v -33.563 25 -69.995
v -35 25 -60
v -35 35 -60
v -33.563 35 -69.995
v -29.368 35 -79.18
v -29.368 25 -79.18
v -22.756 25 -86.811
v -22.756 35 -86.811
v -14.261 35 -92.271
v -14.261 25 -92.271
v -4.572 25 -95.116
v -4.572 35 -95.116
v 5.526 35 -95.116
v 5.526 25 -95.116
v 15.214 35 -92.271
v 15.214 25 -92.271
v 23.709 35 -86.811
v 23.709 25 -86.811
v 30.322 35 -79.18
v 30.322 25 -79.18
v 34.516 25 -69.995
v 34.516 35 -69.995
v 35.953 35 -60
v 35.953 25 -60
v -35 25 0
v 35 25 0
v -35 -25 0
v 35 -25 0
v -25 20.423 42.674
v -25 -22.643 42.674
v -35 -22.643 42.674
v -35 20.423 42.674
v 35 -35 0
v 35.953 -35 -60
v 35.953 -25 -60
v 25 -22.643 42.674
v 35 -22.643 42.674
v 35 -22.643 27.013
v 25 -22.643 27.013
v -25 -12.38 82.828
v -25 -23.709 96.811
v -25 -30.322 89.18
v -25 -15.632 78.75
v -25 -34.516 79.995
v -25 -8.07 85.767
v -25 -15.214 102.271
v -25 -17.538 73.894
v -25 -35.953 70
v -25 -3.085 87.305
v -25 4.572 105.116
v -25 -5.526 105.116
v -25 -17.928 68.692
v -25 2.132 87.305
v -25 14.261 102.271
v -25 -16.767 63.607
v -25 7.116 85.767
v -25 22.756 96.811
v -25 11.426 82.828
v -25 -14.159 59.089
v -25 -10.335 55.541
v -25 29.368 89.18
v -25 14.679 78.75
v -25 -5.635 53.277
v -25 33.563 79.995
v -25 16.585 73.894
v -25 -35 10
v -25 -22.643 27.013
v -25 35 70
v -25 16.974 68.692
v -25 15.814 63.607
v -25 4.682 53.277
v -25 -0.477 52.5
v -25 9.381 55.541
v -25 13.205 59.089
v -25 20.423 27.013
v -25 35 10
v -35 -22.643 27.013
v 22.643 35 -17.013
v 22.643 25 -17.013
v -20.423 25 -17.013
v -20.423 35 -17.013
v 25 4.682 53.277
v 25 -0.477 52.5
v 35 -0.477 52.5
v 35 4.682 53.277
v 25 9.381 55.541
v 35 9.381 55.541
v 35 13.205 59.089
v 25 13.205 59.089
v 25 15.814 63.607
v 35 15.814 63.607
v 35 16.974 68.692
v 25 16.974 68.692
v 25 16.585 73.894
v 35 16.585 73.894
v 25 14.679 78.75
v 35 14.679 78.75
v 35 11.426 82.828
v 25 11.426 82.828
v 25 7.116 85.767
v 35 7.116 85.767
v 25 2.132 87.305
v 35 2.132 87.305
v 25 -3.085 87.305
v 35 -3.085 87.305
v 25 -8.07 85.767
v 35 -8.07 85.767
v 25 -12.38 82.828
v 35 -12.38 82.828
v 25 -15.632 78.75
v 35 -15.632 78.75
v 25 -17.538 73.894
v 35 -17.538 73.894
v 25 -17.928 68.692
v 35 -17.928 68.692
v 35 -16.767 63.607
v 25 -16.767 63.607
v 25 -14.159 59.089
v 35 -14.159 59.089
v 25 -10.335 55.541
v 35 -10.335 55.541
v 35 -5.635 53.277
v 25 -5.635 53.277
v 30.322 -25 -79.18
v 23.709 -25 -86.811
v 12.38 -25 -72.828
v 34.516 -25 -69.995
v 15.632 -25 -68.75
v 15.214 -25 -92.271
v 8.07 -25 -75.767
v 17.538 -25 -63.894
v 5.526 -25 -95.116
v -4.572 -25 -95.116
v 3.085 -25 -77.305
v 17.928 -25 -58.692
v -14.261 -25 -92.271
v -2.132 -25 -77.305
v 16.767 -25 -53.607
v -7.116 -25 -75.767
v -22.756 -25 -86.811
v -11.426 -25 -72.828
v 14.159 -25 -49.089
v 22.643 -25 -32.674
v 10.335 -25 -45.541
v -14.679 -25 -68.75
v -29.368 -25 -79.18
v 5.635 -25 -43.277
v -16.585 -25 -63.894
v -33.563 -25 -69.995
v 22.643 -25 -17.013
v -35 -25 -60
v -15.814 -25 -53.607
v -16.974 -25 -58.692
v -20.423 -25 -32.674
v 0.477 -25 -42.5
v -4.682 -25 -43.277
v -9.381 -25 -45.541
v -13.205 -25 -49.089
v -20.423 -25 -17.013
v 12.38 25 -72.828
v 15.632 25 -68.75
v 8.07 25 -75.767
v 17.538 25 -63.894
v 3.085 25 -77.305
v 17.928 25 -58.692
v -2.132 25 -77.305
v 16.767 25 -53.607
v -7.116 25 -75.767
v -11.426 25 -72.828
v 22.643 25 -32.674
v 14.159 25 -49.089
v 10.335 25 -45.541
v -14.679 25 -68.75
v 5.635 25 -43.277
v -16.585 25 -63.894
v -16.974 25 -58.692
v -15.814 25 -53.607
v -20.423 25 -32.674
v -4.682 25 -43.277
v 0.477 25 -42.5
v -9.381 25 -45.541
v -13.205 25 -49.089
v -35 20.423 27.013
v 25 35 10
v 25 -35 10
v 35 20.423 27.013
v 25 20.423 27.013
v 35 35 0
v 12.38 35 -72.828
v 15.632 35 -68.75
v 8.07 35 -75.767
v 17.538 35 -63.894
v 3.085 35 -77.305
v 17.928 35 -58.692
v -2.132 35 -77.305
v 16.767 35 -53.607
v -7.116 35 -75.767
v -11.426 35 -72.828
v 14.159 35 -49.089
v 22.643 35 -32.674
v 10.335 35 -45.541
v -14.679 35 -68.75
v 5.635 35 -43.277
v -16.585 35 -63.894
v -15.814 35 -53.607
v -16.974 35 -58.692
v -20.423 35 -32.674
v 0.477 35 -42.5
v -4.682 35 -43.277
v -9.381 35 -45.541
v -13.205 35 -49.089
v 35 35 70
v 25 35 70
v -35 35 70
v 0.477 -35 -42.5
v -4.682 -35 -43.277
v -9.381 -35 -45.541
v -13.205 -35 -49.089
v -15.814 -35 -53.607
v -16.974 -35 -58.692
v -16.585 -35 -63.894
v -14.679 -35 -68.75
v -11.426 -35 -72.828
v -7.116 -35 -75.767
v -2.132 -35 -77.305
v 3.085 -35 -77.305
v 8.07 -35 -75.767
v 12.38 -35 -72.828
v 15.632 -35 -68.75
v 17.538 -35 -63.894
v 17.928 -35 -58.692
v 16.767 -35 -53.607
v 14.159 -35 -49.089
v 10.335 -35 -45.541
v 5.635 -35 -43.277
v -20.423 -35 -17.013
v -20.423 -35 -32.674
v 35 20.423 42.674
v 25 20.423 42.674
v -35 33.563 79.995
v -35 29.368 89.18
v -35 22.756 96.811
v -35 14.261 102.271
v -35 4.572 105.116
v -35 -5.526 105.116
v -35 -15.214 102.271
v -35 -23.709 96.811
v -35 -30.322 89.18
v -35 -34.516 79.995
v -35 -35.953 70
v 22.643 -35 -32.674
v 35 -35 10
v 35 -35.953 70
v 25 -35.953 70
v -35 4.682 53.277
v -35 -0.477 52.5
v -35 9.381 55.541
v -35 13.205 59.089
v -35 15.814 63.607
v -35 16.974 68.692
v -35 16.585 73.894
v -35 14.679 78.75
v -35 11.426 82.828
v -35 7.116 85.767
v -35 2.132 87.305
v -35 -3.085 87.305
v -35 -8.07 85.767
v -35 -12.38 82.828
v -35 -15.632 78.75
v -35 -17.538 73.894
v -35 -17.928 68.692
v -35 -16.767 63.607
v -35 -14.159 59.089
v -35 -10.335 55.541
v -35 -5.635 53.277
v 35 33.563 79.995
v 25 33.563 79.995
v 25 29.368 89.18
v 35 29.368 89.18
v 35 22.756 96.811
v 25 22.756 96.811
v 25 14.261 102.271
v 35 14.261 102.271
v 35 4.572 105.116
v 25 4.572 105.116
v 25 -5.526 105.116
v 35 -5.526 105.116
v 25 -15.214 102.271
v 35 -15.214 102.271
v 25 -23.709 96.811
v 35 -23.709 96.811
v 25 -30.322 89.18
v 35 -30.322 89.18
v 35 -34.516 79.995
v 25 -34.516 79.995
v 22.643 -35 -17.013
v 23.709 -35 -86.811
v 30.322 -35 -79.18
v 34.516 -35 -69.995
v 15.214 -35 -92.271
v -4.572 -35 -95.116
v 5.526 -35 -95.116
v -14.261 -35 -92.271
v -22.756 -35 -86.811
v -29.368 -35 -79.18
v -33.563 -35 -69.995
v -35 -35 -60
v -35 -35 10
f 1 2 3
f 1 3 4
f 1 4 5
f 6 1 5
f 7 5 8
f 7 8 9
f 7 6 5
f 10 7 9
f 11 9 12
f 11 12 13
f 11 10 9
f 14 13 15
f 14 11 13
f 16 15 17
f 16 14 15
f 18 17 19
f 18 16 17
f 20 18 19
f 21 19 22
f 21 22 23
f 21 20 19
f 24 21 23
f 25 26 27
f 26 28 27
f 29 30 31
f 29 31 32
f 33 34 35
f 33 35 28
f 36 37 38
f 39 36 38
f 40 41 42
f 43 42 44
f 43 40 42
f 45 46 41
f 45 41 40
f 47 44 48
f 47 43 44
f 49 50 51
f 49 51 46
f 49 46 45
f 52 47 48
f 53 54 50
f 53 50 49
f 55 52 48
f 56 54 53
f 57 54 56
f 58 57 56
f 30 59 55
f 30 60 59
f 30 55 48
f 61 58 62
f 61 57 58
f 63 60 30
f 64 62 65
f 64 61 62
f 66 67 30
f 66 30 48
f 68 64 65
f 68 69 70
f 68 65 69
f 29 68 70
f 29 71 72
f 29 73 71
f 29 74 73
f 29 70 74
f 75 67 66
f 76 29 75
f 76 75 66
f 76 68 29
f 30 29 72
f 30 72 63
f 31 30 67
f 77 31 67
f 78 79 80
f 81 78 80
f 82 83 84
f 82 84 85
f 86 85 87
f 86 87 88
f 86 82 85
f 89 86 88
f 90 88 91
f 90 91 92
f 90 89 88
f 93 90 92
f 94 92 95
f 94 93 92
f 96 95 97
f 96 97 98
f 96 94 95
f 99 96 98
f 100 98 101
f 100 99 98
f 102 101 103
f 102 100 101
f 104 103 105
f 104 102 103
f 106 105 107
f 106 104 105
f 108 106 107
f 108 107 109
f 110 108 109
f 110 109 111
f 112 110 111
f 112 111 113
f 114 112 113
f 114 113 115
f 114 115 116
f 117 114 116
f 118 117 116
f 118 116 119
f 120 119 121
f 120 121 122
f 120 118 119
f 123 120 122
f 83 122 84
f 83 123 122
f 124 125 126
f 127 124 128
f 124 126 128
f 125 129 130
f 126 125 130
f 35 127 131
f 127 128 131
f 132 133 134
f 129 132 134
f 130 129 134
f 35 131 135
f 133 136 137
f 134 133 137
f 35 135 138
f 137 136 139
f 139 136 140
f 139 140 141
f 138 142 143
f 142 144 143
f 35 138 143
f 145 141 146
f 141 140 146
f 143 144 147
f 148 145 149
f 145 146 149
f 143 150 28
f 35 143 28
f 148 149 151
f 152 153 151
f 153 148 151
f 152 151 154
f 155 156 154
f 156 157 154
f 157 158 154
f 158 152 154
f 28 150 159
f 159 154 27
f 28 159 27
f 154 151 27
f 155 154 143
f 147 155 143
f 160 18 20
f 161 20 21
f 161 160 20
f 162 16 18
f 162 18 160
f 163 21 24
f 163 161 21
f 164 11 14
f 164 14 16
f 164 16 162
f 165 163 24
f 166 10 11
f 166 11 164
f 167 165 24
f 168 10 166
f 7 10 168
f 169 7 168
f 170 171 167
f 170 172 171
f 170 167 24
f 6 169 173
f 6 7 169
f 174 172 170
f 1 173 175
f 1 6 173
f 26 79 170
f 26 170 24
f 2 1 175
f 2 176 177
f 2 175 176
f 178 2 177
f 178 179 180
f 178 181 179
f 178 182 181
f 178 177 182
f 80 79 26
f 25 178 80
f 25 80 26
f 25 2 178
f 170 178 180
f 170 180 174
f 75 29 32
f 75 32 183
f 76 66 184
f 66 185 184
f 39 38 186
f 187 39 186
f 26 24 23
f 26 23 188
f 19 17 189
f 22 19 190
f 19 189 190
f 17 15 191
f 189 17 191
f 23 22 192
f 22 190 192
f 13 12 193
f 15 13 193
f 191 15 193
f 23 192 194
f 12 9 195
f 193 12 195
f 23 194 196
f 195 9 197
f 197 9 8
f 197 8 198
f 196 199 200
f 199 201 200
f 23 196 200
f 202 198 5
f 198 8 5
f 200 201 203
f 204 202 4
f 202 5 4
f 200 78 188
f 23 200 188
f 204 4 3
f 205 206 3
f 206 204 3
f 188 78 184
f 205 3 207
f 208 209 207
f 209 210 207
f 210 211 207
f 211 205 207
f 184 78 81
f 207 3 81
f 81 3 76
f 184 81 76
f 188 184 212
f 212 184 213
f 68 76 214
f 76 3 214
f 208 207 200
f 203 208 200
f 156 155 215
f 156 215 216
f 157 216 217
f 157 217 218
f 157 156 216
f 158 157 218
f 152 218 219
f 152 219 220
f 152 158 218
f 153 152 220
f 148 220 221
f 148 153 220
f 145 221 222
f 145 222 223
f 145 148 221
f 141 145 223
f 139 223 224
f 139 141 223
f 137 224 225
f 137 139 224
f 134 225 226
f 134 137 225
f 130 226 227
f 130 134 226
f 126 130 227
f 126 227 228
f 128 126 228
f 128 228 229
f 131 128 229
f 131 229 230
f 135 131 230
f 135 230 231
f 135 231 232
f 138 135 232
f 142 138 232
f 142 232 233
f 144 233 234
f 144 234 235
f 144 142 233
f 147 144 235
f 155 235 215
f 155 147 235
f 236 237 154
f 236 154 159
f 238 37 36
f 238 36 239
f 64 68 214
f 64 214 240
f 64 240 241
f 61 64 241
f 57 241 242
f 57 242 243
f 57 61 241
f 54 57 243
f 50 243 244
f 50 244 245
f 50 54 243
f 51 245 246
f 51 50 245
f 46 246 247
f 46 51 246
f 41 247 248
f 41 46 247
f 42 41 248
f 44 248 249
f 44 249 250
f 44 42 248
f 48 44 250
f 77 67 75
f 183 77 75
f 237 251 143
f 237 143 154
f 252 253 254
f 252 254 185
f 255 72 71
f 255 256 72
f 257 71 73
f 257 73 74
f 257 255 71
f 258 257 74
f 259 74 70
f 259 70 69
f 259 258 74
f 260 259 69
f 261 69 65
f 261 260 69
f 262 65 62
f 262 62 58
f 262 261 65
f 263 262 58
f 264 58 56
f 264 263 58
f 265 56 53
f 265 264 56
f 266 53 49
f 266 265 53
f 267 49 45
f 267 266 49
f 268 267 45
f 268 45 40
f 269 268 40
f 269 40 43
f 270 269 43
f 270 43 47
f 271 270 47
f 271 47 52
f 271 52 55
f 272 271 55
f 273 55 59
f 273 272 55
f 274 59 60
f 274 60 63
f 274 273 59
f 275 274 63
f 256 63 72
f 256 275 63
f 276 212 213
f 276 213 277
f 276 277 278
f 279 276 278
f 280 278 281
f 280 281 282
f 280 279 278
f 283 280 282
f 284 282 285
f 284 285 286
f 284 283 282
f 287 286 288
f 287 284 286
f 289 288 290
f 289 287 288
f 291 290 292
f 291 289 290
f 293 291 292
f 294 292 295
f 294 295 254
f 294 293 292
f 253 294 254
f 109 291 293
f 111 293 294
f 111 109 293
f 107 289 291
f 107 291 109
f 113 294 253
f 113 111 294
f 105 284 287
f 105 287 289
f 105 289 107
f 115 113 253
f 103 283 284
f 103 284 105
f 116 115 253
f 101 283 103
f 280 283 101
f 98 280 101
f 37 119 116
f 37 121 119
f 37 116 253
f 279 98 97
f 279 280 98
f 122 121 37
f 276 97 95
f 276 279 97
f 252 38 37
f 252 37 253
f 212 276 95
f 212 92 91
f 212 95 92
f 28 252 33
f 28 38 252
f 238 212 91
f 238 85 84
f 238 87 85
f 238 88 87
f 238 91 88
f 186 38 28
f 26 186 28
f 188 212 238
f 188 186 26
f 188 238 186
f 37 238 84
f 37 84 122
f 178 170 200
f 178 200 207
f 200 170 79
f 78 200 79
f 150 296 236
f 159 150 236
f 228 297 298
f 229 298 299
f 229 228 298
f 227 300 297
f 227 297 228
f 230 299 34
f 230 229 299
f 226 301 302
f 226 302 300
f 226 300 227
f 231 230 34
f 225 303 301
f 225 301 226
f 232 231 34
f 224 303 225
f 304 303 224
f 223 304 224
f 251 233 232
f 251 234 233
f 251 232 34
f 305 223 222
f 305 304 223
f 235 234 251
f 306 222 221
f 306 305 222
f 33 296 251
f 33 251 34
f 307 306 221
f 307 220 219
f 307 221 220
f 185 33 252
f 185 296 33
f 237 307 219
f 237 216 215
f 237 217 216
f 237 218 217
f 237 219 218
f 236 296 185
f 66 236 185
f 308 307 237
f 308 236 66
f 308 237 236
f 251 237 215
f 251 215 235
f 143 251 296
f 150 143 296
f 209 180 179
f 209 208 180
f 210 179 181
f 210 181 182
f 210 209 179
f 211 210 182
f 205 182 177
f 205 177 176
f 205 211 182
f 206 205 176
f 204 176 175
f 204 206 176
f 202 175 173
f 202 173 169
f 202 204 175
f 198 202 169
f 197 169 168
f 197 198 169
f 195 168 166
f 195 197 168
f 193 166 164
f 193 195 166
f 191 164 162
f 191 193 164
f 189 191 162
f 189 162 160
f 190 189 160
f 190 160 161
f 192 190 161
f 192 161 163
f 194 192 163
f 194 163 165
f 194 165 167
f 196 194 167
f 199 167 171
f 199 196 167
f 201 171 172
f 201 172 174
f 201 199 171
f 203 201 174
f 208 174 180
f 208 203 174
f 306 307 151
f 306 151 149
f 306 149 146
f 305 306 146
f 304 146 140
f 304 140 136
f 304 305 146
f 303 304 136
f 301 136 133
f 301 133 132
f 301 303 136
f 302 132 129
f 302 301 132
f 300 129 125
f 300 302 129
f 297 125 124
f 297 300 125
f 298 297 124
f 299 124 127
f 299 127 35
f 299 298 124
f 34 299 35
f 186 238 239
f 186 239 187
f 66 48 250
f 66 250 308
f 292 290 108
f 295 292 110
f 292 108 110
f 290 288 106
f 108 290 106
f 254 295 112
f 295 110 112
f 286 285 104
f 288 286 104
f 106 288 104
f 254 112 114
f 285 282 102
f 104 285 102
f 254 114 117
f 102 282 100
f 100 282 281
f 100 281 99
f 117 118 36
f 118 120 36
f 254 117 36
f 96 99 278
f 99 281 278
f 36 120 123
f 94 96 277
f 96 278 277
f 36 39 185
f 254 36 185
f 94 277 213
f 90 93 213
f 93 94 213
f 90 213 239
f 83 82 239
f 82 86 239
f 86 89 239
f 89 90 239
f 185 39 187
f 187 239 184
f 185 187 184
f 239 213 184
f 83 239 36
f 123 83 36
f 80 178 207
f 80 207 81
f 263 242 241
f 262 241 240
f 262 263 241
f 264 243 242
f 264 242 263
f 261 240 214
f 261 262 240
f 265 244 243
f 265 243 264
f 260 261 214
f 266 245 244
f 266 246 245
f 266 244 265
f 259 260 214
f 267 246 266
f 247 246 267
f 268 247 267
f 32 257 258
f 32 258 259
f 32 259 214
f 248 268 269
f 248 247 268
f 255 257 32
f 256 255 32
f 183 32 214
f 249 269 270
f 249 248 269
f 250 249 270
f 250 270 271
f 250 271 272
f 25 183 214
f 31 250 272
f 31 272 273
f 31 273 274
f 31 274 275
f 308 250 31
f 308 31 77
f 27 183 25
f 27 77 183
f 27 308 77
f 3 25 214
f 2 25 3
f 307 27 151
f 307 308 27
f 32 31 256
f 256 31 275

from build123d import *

# Parameters (mm, degrees)
SKETCH_1_W          = 70
SKETCH_1_H          = 70
EXTRUDE_1_DEPTH     = 10
SKETCH_2_R          = 17.5
SKETCH_2_W          = 15.660204931
SKETCH_2_H          = 43.06556356
EXTRUDE_2_DEPTH     = 35
SKETCH_2_2_R        = 17.5
SKETCH_2_2_W        = 15.660204931
SKETCH_2_2_H        = 43.06556356
CUT_EXTRUDE_1_DEPTH = 25
SKETCH_3_R          = 17.5
SKETCH_3_W          = 15.660204931
SKETCH_3_H          = 43.06556356
EXTRUDE_3_DEPTH     = 35
SKETCH_3_3_R        = 17.5
SKETCH_3_3_W        = 15.660204931
SKETCH_3_3_H        = 43.06556356
CUT_EXTRUDE_2_DEPTH = 25


with BuildPart() as part:
    # 草圖1 → 填料-伸長1 (new body)
    with BuildSketch(Plane.XY):
        Rectangle(SKETCH_1_W, SKETCH_1_H)
    extrude(amount=EXTRUDE_1_DEPTH)

    # 草圖2 → 填料-伸長2 (add, symmetric)
    with BuildSketch(Plane(origin=(0, 0, 0), x_dir=(0, 0, -1), z_dir=(1, 0, 0))):
        with BuildLine():
            Line((-10, 35), (-70, 35))
            ThreePointArc((-70, 35), (-105.476695364, -0.476695364), (-70, -35.953390728))
            Line((-70, -35.953390728), (-10, -35))
            Line((-10, -35), (-10, 35))
        make_face()
        with Locations((-70, -0.476695364)):
            Circle(SKETCH_2_R, mode=Mode.SUBTRACT)
        with Locations((-34.843422831, -1.110145808)):
            Rectangle(SKETCH_2_W, SKETCH_2_H, mode=Mode.SUBTRACT)
    extrude(amount=EXTRUDE_2_DEPTH, both=True)

    # 草圖2<2> → 除料-伸長1 (cut, symmetric)
    with BuildSketch(Plane(origin=(0, 0, 0), x_dir=(0, 0, -1), z_dir=(1, 0, 0))):
        with BuildLine():
            Line((-10, 35), (-70, 35))
            ThreePointArc((-70, 35), (-105.476695364, -0.476695364), (-70, -35.953390728))
            Line((-70, -35.953390728), (-10, -35))
            Line((-10, -35), (-10, 35))
        make_face()
        with Locations((-70, -0.476695364)):
            Circle(SKETCH_2_2_R, mode=Mode.SUBTRACT)
        with Locations((-34.843422831, -1.110145808)):
            Rectangle(SKETCH_2_2_W, SKETCH_2_2_H, mode=Mode.SUBTRACT)
    extrude(amount=CUT_EXTRUDE_1_DEPTH, both=True, mode=Mode.SUBTRACT)

    # 草圖3 → 填料-伸長3 (add, symmetric)
    with BuildSketch(Plane(origin=(0, 0, 10), x_dir=(0, 0, 1), z_dir=(0, -1, 0))):
        with BuildLine():
            Line((-10, 35), (-70, 35))
            ThreePointArc((-70, 35), (-105.476695364, -0.476695364), (-70, -35.953390728))
            Line((-70, -35.953390728), (-10, -35))
            Line((-10, -35), (-10, 35))
        make_face()
        with Locations((-70, -0.476695364)):
            Circle(SKETCH_3_R, mode=Mode.SUBTRACT)
        with Locations((-34.843422831, -1.110145808)):
            Rectangle(SKETCH_3_W, SKETCH_3_H, mode=Mode.SUBTRACT)
    extrude(amount=EXTRUDE_3_DEPTH, both=True)

    # 草圖3<3> → 除料-伸長2 (cut, symmetric)
    with BuildSketch(Plane(origin=(0, 0, 10), x_dir=(0, 0, 1), z_dir=(0, -1, 0))):
        with BuildLine():
            Line((-10, 35), (-70, 35))
            ThreePointArc((-70, 35), (-105.476695364, -0.476695364), (-70, -35.953390728))
            Line((-70, -35.953390728), (-10, -35))
            Line((-10, -35), (-10, 35))
        make_face()
        with Locations((-70, -0.476695364)):
            Circle(SKETCH_3_3_R, mode=Mode.SUBTRACT)
        with Locations((-34.843422831, -1.110145808)):
            Rectangle(SKETCH_3_3_W, SKETCH_3_3_H, mode=Mode.SUBTRACT)
    extrude(amount=CUT_EXTRUDE_2_DEPTH, both=True, mode=Mode.SUBTRACT)


solid = part.part
